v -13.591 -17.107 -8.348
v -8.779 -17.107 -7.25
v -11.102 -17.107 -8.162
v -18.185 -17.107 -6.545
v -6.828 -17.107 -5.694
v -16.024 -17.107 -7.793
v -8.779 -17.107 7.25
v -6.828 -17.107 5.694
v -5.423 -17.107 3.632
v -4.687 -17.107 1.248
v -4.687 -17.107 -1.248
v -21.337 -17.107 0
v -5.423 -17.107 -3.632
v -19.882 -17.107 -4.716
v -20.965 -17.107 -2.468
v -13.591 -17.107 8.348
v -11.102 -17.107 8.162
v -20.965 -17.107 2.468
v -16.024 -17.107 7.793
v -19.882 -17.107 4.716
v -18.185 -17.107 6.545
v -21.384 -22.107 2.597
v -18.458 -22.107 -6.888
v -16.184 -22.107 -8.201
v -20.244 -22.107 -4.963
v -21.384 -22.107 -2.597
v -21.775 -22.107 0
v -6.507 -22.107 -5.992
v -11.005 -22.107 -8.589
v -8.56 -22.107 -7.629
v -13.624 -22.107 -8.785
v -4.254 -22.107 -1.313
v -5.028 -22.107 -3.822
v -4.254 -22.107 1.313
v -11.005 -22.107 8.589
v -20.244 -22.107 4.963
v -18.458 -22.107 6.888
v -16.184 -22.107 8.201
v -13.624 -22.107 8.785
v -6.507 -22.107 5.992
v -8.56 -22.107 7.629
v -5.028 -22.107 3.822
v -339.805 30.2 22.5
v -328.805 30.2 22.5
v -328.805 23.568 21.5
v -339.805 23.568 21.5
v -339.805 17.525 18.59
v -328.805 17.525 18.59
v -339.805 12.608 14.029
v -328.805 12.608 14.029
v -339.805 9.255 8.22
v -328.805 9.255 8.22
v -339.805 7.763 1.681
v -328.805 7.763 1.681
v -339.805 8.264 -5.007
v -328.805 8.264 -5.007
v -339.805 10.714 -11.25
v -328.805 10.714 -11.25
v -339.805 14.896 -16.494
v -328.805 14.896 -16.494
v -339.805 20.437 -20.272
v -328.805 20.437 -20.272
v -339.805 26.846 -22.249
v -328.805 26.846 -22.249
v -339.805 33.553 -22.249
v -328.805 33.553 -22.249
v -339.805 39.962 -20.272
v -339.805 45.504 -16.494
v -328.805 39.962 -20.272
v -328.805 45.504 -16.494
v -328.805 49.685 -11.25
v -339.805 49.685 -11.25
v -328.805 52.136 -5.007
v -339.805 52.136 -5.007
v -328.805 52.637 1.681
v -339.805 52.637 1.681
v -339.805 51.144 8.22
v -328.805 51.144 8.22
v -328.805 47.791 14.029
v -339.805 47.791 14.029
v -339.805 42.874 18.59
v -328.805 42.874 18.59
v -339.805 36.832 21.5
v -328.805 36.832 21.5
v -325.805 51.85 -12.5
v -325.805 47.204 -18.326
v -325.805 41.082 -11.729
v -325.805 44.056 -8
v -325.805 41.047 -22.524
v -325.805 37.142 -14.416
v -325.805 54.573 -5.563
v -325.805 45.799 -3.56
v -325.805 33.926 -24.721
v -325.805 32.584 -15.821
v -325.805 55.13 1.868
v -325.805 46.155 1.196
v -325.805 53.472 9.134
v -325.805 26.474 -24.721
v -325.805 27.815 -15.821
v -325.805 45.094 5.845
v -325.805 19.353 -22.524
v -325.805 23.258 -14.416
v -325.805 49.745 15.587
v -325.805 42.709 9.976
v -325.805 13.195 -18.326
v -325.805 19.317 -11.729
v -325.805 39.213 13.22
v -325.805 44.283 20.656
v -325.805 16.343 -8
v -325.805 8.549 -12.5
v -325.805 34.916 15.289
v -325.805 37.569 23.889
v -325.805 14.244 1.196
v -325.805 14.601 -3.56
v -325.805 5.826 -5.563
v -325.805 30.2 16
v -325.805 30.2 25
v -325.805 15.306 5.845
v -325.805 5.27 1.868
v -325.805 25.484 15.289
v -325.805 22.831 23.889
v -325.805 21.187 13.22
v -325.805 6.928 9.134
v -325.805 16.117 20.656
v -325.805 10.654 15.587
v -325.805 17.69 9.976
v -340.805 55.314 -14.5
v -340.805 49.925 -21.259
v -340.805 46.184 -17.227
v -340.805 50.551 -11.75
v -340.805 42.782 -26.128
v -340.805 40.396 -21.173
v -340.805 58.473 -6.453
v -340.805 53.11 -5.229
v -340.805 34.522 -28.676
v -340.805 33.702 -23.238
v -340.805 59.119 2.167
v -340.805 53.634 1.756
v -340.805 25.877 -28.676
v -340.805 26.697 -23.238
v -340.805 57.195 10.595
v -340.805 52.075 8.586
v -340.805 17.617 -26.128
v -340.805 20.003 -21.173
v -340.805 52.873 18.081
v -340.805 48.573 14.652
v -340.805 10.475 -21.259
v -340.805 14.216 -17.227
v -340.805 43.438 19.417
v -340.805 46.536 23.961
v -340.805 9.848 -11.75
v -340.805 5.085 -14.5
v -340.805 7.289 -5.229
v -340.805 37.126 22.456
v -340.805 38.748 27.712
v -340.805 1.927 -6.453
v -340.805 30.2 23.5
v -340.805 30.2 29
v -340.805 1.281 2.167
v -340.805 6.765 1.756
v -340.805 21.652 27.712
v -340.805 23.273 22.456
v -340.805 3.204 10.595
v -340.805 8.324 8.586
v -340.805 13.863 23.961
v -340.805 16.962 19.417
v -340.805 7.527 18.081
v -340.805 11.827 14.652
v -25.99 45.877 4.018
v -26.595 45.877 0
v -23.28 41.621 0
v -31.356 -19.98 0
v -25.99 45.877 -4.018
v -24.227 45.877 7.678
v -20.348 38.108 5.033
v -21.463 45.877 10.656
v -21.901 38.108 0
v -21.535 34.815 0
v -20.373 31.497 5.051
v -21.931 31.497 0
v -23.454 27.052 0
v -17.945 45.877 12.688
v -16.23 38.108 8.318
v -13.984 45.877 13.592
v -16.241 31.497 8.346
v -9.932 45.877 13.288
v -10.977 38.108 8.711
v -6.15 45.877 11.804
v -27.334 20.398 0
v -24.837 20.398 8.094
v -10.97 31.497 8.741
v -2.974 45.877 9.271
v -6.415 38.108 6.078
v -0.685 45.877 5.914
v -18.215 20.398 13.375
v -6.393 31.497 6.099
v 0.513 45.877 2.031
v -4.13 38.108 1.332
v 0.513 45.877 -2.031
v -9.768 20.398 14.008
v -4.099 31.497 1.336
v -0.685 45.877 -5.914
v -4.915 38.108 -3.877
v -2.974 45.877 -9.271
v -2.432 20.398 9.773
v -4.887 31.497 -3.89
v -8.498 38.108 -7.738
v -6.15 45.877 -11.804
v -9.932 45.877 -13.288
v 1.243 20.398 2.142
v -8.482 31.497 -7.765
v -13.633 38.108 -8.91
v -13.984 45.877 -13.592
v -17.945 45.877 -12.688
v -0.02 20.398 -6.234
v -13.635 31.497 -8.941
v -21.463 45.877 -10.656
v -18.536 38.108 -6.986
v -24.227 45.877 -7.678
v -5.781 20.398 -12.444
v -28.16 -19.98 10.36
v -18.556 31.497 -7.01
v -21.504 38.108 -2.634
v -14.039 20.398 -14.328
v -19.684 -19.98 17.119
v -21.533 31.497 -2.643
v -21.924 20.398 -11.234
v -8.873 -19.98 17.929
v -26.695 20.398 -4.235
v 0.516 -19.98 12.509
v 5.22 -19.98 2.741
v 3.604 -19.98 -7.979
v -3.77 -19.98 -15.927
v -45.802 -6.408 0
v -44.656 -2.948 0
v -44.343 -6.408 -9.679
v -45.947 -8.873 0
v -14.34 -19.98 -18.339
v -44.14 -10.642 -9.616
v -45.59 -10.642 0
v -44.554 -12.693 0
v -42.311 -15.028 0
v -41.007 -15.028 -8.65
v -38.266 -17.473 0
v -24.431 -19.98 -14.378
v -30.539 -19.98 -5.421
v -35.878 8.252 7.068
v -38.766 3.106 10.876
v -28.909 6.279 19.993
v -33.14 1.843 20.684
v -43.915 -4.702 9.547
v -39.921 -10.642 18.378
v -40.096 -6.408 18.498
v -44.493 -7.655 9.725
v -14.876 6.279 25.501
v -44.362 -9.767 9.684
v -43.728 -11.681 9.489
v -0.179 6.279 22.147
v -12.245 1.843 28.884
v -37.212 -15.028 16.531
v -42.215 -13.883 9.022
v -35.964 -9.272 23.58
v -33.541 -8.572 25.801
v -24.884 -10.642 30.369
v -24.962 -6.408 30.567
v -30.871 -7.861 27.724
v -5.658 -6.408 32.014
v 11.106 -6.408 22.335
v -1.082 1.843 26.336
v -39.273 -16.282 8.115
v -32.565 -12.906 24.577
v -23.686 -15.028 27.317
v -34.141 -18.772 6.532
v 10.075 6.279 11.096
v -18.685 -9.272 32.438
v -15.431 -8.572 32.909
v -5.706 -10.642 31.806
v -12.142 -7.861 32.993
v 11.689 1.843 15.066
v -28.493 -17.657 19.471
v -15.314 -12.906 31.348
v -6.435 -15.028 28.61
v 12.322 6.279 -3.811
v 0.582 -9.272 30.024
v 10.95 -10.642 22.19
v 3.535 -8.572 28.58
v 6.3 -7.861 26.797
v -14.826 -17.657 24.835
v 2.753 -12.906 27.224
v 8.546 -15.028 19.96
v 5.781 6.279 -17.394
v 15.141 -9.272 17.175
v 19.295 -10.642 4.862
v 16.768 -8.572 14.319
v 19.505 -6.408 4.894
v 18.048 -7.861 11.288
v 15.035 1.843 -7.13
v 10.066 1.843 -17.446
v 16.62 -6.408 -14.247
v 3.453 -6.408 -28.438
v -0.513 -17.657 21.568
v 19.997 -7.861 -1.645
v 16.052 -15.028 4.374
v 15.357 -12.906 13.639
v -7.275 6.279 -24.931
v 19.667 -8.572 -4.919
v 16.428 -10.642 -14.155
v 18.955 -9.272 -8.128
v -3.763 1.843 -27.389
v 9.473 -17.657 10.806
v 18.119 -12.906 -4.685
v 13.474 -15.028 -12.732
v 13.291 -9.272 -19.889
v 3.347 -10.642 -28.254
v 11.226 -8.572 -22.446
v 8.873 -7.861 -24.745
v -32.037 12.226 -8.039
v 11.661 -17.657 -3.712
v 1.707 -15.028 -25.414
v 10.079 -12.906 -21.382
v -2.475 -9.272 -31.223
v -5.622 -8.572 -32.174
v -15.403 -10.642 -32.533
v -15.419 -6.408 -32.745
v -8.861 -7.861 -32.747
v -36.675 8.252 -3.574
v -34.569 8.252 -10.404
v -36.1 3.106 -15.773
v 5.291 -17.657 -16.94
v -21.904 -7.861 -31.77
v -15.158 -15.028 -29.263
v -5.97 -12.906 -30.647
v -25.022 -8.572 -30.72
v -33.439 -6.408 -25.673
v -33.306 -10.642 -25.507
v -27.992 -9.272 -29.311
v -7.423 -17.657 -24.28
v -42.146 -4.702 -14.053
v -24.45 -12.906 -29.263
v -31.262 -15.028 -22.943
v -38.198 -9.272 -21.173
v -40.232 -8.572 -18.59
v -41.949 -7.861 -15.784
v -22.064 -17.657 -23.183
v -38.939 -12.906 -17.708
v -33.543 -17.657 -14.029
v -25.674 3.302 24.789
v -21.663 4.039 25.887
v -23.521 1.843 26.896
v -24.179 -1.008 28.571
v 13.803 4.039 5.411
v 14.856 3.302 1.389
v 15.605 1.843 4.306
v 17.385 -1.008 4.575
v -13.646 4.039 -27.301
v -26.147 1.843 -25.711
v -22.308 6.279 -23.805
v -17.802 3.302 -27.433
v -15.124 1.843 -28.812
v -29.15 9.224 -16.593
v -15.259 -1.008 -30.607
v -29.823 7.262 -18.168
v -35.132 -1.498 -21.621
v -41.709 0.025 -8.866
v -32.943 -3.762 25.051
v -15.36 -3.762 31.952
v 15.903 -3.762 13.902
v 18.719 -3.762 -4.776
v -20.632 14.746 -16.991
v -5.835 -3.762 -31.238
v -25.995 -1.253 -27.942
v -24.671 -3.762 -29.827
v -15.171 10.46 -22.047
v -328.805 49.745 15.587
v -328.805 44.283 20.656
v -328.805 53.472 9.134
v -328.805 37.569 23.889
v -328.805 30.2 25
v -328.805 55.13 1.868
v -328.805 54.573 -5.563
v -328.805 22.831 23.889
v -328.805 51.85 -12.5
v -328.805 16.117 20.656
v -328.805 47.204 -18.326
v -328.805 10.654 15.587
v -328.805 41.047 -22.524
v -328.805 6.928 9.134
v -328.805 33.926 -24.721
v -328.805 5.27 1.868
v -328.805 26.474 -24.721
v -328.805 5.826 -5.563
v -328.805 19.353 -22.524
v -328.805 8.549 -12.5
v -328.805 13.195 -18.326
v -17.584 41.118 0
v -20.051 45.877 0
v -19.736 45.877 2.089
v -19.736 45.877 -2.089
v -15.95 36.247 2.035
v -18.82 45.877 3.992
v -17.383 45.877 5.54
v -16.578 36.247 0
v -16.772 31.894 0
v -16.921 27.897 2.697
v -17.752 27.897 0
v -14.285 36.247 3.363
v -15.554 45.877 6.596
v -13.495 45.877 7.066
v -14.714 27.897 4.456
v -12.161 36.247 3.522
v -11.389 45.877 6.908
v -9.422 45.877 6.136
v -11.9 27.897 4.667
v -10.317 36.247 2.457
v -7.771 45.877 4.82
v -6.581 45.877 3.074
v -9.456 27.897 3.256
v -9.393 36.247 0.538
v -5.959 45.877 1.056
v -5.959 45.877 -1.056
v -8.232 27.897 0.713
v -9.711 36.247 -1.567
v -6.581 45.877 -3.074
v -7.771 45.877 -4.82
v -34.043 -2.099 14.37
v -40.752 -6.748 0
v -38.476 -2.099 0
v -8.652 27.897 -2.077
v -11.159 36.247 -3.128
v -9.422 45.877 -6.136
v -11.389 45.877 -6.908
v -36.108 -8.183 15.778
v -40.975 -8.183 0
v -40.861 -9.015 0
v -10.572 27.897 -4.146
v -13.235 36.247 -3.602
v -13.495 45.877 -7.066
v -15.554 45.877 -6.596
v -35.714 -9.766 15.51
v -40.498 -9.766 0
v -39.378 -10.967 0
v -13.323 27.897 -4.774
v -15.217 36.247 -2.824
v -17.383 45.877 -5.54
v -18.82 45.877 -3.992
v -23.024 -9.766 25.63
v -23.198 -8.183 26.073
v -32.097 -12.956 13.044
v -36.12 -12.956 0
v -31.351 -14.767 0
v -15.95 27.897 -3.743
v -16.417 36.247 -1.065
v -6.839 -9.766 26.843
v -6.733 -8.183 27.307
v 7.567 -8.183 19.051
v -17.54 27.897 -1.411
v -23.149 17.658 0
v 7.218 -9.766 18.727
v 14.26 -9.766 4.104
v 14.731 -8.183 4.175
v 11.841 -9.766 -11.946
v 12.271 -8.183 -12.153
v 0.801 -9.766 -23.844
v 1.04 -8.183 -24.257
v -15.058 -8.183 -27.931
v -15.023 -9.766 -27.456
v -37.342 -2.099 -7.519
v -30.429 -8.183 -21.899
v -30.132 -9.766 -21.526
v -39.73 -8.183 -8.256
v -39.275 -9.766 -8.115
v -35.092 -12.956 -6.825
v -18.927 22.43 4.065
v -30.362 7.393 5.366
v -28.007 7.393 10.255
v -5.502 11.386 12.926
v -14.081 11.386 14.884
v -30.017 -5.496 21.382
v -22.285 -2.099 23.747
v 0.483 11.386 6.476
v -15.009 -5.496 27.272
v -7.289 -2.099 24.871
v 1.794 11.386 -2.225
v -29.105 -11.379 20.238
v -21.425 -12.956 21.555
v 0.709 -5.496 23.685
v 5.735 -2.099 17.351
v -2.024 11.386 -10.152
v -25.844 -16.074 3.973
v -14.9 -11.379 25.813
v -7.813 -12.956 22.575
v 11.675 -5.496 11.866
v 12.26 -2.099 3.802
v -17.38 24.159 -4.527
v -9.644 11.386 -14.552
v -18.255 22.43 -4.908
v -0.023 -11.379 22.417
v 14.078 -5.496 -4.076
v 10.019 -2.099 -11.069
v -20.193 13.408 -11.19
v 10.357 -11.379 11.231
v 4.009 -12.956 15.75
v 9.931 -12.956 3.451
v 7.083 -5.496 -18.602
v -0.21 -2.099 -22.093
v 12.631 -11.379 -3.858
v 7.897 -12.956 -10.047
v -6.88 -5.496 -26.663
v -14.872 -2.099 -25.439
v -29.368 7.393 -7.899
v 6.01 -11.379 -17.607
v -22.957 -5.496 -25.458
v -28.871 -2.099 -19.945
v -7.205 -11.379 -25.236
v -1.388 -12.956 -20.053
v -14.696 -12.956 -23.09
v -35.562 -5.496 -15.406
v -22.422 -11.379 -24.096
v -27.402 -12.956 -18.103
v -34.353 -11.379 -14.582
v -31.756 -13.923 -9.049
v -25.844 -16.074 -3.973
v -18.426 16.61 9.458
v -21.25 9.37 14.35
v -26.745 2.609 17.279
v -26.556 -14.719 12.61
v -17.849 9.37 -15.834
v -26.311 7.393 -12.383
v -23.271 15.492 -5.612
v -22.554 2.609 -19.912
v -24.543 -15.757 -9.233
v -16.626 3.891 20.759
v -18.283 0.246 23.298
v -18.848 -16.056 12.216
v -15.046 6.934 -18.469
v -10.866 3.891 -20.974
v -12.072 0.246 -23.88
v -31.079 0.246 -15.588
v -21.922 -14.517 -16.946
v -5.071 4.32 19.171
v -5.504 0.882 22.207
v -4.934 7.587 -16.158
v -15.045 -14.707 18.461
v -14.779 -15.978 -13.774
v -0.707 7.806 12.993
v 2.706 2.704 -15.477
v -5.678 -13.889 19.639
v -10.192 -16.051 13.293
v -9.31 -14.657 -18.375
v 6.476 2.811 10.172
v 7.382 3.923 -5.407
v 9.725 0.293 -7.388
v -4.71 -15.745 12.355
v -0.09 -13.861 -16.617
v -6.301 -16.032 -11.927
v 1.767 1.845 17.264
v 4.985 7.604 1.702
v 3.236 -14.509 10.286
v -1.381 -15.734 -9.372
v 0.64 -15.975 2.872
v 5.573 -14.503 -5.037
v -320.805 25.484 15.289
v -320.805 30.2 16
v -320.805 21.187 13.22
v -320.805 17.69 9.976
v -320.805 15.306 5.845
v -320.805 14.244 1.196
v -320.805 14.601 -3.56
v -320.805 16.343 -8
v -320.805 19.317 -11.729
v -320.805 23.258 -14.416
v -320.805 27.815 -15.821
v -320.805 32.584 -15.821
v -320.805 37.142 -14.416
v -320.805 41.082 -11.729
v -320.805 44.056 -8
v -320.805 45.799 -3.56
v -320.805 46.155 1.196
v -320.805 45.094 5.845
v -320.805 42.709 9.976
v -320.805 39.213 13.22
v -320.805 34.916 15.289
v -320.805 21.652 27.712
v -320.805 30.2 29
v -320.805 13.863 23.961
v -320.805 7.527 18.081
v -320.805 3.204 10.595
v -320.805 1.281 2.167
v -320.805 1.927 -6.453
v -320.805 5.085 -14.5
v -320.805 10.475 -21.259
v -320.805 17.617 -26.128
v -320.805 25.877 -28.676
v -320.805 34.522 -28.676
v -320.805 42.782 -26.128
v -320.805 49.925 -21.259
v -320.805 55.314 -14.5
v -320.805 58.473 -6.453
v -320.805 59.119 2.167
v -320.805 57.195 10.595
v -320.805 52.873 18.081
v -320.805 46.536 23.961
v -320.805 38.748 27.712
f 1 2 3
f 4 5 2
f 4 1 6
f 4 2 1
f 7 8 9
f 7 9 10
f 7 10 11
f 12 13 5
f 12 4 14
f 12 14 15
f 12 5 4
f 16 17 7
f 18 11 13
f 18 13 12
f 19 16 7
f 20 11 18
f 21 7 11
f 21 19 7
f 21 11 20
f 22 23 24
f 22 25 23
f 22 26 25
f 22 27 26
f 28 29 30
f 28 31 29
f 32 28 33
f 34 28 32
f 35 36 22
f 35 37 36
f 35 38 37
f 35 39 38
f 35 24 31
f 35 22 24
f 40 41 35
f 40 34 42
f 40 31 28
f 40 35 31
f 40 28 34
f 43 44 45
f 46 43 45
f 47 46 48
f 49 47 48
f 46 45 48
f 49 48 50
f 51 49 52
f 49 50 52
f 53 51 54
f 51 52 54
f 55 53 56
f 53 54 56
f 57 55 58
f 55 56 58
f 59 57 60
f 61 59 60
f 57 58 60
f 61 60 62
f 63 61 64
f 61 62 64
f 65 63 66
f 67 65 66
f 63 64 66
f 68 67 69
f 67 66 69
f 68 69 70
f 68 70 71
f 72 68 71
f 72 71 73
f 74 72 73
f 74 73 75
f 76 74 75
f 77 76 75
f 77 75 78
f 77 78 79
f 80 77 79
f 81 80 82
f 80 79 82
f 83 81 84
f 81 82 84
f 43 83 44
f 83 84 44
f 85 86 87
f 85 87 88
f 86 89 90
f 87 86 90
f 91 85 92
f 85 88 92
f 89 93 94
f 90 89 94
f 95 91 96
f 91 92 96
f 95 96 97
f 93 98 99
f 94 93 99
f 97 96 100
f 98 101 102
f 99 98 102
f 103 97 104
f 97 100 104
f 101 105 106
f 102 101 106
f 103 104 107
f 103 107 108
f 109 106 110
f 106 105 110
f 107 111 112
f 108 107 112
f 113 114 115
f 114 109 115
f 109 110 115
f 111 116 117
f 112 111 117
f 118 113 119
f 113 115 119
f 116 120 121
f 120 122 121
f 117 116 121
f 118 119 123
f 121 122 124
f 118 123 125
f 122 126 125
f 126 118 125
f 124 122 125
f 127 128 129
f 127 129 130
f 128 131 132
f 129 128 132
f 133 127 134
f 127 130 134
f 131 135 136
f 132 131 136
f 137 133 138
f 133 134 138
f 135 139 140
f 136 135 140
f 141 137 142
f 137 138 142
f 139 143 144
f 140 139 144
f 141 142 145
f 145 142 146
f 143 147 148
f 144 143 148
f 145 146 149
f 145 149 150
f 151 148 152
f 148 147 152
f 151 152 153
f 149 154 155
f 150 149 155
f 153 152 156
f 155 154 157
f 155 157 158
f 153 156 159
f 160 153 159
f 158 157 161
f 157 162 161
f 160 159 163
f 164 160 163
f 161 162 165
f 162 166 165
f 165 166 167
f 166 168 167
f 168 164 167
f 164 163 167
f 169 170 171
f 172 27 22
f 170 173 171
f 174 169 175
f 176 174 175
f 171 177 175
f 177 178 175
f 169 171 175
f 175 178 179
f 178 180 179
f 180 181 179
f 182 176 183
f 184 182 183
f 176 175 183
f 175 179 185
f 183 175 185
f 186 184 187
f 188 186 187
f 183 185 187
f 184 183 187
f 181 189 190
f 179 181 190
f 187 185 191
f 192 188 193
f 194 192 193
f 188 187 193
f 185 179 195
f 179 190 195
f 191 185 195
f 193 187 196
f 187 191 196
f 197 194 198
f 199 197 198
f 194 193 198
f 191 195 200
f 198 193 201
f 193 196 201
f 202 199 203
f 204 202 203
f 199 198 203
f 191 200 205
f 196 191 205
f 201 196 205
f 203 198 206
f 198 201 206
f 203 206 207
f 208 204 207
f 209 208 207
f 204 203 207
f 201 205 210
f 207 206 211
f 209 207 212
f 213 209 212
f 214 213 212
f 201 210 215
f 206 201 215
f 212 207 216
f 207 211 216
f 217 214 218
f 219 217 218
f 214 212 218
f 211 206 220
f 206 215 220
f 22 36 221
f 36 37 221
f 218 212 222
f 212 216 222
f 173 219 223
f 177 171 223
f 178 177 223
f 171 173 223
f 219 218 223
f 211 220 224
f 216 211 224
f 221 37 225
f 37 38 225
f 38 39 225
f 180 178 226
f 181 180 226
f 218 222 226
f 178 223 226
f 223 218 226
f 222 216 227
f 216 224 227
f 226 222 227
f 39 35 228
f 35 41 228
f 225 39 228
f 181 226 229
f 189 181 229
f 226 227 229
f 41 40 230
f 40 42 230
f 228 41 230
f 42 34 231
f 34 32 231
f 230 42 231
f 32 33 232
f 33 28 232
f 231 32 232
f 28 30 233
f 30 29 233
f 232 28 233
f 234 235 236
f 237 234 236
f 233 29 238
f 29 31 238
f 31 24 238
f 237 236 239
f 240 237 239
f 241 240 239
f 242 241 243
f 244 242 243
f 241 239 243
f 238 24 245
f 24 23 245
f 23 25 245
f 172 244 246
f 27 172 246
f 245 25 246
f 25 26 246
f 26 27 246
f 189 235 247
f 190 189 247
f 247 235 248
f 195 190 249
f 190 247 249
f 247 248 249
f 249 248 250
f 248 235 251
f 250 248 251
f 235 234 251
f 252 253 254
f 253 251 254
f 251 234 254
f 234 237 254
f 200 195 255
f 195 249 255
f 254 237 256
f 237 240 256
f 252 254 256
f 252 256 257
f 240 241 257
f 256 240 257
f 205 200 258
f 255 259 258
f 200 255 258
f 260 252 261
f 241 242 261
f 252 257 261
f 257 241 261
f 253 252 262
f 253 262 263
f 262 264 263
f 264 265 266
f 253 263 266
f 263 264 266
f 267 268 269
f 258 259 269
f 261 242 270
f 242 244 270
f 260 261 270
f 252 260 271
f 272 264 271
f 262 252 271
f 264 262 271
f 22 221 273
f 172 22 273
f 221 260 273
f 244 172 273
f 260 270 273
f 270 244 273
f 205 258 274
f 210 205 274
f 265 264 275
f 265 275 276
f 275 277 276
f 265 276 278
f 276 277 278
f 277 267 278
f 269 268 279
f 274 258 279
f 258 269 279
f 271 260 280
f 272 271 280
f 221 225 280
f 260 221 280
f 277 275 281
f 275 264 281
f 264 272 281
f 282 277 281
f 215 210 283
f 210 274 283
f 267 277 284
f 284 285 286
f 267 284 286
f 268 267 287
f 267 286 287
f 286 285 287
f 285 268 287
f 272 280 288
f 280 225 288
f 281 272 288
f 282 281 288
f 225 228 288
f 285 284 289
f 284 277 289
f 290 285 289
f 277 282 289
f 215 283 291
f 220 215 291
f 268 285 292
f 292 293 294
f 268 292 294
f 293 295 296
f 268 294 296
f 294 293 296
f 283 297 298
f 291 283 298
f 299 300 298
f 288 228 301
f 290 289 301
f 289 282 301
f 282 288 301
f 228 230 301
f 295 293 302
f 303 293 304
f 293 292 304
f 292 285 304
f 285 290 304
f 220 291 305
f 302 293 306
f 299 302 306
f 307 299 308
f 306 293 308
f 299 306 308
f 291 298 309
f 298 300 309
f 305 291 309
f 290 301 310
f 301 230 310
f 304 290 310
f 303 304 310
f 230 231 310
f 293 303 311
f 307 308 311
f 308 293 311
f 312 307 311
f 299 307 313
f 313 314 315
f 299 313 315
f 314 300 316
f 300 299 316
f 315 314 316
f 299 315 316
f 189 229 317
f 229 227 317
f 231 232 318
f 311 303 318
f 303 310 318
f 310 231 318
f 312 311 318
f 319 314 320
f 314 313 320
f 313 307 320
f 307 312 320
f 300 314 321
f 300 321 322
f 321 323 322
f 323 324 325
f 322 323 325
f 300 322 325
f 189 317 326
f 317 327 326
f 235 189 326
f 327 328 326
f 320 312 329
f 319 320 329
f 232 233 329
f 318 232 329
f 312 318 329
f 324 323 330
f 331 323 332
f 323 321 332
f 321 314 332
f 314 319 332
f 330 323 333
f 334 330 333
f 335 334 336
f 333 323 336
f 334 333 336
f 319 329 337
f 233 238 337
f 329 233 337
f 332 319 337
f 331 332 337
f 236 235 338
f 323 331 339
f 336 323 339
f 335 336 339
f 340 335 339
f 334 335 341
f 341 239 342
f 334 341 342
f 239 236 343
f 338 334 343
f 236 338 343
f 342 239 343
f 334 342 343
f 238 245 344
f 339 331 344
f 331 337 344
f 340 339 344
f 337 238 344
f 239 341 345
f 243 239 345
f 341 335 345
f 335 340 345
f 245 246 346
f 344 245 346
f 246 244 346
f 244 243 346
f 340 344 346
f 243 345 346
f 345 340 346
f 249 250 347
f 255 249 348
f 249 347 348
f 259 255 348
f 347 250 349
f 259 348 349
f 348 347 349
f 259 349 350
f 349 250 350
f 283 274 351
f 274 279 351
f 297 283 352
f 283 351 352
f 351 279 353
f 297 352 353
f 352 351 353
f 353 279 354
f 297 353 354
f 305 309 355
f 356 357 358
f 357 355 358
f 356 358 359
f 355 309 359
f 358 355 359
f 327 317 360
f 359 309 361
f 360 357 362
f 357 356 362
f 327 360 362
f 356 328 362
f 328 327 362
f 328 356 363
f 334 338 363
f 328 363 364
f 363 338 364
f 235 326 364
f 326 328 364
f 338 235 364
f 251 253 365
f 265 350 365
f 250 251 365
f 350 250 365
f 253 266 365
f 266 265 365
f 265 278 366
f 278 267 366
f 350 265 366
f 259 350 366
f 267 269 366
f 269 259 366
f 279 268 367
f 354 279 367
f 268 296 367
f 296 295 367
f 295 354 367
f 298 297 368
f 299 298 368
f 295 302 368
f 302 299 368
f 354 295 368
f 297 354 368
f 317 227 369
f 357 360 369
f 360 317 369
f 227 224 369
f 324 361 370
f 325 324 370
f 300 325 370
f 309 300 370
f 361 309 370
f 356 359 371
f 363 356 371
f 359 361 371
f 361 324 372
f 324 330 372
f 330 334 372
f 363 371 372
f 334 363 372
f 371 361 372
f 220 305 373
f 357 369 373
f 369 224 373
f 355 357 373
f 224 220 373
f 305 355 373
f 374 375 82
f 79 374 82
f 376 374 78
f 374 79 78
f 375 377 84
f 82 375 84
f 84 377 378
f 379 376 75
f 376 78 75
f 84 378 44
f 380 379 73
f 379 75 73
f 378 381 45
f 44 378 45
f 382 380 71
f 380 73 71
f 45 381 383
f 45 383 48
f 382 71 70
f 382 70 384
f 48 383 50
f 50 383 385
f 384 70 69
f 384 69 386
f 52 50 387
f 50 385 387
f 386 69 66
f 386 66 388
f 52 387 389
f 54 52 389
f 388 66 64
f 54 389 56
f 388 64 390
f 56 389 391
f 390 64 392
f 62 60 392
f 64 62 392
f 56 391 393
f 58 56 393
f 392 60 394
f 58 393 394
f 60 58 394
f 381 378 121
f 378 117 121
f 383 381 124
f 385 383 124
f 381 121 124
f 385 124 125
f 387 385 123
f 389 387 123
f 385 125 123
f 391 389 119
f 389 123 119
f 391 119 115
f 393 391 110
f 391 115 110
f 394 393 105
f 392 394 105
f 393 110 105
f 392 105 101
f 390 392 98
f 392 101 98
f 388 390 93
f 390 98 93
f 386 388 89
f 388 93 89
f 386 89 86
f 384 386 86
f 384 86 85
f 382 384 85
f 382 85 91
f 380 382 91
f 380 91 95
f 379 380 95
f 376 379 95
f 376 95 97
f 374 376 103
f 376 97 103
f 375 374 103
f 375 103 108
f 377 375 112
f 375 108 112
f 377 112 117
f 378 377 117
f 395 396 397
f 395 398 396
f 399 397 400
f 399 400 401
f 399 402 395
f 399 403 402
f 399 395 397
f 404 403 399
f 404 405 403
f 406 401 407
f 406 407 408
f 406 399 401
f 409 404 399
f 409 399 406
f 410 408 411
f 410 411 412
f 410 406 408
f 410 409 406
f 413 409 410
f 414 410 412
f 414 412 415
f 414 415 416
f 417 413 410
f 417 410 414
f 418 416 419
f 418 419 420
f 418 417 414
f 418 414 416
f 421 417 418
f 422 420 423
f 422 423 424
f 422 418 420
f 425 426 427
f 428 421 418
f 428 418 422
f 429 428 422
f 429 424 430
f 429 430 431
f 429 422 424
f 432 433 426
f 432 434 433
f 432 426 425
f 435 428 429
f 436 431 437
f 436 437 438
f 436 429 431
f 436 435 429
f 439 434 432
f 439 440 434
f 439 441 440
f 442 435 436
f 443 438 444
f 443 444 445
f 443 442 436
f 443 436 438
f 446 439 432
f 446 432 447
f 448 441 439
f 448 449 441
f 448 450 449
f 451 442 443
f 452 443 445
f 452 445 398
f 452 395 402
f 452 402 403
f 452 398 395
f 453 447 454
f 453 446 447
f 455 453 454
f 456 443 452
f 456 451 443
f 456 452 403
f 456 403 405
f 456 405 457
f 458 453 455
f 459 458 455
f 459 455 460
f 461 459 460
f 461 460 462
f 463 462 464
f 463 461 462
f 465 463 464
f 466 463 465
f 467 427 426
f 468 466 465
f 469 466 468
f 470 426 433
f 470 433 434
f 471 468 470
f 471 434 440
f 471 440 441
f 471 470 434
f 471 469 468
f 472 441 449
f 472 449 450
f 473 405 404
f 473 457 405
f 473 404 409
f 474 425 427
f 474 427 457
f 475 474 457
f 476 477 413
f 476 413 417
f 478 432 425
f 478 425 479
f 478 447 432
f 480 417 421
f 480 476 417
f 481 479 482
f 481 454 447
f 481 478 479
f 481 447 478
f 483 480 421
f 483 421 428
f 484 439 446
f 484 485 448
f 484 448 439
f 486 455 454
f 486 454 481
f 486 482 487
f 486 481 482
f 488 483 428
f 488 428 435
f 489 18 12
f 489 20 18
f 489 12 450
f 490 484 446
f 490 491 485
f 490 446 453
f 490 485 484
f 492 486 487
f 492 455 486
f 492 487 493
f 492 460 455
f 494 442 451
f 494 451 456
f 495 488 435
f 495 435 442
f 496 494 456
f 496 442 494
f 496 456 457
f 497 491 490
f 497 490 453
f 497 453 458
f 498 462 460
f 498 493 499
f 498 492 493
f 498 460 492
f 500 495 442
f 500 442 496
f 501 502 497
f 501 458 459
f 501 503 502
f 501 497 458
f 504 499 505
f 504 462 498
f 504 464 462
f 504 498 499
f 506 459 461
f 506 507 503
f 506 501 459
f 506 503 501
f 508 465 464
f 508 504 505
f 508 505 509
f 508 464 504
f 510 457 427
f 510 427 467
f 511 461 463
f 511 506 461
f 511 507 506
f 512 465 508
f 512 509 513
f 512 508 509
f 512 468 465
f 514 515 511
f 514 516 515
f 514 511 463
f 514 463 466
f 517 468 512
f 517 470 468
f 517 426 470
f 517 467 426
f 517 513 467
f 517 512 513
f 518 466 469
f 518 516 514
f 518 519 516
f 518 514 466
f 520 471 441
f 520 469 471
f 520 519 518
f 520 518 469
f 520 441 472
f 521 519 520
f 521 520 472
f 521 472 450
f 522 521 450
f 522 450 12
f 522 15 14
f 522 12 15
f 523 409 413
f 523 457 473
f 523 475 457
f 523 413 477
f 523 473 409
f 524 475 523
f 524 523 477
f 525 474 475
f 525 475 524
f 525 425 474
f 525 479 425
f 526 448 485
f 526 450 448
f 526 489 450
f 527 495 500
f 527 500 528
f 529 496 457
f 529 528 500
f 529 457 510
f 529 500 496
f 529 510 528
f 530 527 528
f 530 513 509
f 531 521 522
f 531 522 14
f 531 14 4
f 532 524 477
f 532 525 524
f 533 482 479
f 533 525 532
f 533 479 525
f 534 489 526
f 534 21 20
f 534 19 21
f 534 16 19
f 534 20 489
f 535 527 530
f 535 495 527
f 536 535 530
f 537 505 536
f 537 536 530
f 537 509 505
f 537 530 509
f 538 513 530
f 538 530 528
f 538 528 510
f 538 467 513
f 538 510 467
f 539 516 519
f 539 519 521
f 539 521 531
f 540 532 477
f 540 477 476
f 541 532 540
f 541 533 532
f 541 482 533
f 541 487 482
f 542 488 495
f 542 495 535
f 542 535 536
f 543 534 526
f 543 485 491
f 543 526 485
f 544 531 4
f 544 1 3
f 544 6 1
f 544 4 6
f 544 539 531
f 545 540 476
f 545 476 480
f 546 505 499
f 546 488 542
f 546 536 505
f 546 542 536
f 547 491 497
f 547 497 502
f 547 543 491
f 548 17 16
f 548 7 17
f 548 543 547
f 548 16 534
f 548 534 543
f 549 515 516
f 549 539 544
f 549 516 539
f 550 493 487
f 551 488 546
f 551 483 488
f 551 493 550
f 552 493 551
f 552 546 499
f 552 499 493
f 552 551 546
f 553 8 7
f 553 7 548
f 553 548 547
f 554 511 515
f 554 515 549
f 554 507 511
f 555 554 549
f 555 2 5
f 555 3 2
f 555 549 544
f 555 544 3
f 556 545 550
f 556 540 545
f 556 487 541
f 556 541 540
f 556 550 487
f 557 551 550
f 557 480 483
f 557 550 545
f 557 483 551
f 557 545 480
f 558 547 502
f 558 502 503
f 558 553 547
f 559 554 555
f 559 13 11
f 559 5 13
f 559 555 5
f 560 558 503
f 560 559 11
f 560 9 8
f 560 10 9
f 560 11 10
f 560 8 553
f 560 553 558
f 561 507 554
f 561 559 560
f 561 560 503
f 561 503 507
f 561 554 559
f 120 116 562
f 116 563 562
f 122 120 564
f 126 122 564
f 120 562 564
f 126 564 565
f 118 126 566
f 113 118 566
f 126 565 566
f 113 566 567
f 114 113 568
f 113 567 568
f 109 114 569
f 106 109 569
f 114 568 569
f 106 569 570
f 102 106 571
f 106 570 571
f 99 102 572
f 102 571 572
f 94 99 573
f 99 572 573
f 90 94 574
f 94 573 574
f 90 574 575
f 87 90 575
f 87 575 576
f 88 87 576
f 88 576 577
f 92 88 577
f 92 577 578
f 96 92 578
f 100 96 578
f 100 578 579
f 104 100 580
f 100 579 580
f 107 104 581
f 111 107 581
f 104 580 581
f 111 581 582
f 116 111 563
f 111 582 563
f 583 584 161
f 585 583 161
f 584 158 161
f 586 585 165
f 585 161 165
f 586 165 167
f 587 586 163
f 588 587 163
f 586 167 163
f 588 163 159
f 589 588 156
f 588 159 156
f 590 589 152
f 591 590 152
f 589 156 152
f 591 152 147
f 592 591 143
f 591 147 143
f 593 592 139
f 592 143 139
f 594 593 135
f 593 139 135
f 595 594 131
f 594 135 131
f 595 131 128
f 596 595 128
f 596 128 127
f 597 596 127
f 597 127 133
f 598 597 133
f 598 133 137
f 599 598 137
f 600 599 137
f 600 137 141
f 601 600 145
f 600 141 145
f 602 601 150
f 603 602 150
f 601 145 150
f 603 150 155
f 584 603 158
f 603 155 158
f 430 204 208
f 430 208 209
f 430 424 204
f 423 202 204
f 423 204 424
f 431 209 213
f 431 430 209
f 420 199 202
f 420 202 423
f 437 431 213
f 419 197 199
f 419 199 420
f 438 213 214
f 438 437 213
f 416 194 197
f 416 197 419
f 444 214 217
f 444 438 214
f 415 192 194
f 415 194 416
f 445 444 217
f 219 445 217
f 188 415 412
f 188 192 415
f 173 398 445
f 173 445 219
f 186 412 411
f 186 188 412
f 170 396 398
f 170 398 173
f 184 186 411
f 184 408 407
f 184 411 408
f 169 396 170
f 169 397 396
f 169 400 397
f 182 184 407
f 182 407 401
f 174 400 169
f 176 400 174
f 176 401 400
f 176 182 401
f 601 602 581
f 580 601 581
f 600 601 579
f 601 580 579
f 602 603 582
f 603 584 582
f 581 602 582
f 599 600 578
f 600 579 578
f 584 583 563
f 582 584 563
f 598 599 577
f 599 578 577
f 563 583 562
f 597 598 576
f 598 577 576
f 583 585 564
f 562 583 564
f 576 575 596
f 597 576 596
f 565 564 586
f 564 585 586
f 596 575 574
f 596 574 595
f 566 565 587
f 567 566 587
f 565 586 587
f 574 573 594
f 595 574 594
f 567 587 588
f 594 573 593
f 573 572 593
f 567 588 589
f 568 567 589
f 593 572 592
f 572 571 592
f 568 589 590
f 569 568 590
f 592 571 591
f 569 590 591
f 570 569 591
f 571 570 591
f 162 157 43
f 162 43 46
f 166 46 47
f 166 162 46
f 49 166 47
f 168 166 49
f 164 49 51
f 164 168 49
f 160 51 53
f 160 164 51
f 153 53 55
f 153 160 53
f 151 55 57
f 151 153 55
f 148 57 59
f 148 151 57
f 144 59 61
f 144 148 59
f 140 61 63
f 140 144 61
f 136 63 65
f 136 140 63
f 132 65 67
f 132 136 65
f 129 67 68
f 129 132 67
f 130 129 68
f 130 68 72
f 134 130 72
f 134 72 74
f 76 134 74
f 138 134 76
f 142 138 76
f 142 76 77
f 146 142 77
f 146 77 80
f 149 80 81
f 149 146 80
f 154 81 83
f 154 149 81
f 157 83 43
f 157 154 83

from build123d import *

# Parameters (mm, degrees)
CHAMFER_1_SIZE = 1


with BuildPart() as part:
    # 草图1 → 旋转1 (revolve)
    with BuildSketch(Plane.XY):
        with BuildLine():
            Line((-26.595370865, 45.877014743), (-12.965243297, 45.877014743))
            Line((-12.965243297, 45.877014743), (-12.965243297, -22.107402032))
            Line((-12.965243297, -22.107402032), (-21.774959896, -22.107402032))
            add(Edge.make_bspline(
                [(-26.595370865, 45.877014743), (-0.79666506, 20.580411041), (-85.246154667, -11.005701732), (-21.774959896, -22.107402032)],
                knots=[0, 0, 0, 0, 1, 1, 1, 1], degree=3))
        make_face()
    revolve(axis=Axis((-12.965243297, -22.107402032, 0), (0, 1, 0)))

    # 草图2 → 切除-旋转1 (revolve, cut)
    with BuildSketch(Plane.XY):
        with BuildLine():
            Line((-21.33685257, -17.107402032), (-12.965243297, -17.107402032))
            Line((-12.965243297, -17.107402032), (-12.965243297, 45.176601137))
            Line((-12.965243297, 45.176601137), (-12.965243297, 45.877014743))
            Line((-12.965243297, 45.877014743), (-15.079937913, 45.877014743))
            Line((-15.079937913, 45.877014743), (-20.050946276, 45.877014743))
            add(Edge.make_bspline(
                [(-20.050946276, 45.877014743), (-19.550092699, 45.15808437), (-19.082694604, 44.396653294), (-18.065882081, 42.448069869), (-17.568018156, 41.216451543), (-16.851866931, 38.653309297), (-16.635479489, 37.324605775), (-16.490180844, 34.692172894), (-16.559259119, 33.390767191), (-16.91197585, 30.891288816), (-17.19374796, 29.692309456), (-17.893163724, 27.407100616), (-18.310604377, 26.319742349), (-19.22912405, 24.239387784), (-19.730478684, 23.245959998), (-21.313284194, 20.375381767), (-22.470924152, 18.605669157), (-24.862928031, 15.230622799), (-26.099862655, 13.626150262), (-28.588631418, 10.509195003), (-29.841552488, 8.997271276), (-32.30829136, 6.019214188), (-33.523283885, 4.553037065), (-35.260517924, 2.366301479), (-35.825145688, 1.639587978), (-36.910093308, 0.189930887), (-37.430544042, -0.533162703), (-38.404330877, -1.971254233), (-38.85782556, -2.686654553), (-39.662779294, -4.092456136), (-40.014012489, -4.78370185), (-40.565865888, -6.093401153), (-40.764055532, -6.711392977), (-40.92491158, -7.510539933), (-40.956290903, -7.755037527), (-40.980879788, -8.193625915), (-40.974460454, -8.387318334), (-40.933649478, -8.736390668), (-40.899762009, -8.892321127), (-40.802536299, -9.198552263), (-40.738757399, -9.349882034), (-40.564347825, -9.672166644), (-40.453097754, -9.843030046), (-40.170702988, -10.204686784), (-39.999609939, -10.39495082), (-39.398493882, -10.978497512), (-38.880826757, -11.381755698), (-37.688110613, -12.154490491), (-37.014717804, -12.525057552), (-35.576226607, -13.219986812), (-34.810812538, -13.545081172), (-33.223877984, -14.152835912), (-32.402042598, -14.435715659), (-29.882187776, -15.230191934), (-28.131531206, -15.688289387), (-25.457022646, -16.299951348), (-24.556828639, -16.49113738), (-23.197090705, -16.761790819), (-22.742253978, -16.849314163), (-22.057942614, -16.976866822), (-21.829530531, -17.018755203), (-21.512788186, -17.075933319), (-21.424945598, -17.091691842), (-21.33685257, -17.107402032)],
                knots=[0.040556796, 0.040556796, 0.040556796, 0.040556796, 0.0625, 0.0625, 0.09375, 0.09375, 0.125, 0.125, 0.15625, 0.15625, 0.1875, 0.1875, 0.21875, 0.21875, 0.25, 0.25, 0.3125, 0.3125, 0.375, 0.375, 0.4375, 0.4375, 0.5, 0.5, 0.53125, 0.53125, 0.5625, 0.5625, 0.59375, 0.59375, 0.625, 0.625, 0.65625, 0.65625, 0.671875, 0.671875, 0.6875, 0.6875, 0.703125, 0.703125, 0.71875, 0.71875, 0.734375, 0.734375, 0.75, 0.75, 0.78125, 0.78125, 0.8125, 0.8125, 0.84375, 0.84375, 0.875, 0.875, 0.9375, 0.9375, 0.96875, 0.96875, 0.984375, 0.984375, 0.9921875, 0.9921875, 0.995189865, 0.995189865, 0.995189865, 0.995189865], degree=3))
        make_face()
    revolve(axis=Axis((-12.965243297, -17.107402032, 0), (0, 1, 0)), mode=Mode.SUBTRACT)


with BuildPart() as body_2:
    # 草图3 → 旋转2 (revolve)
    with BuildSketch(Plane.XY, mode=Mode.PRIVATE) as revolve_2_sk:
        Polygon((-340.805095673, 52.699663326), (-328.805095673, 52.699663326), (-328.805095673, 55.199663326), (-325.805095673, 55.199663326), (-325.805095673, 46.199663326), (-320.805095673, 46.199663326), (-320.805095673, 59.199663326), (-340.805095673, 59.199663326), align=None)
    revolve(revolve_2_sk.sketch.rotate(Axis((-386.410262995, 30.199663326, 0), (1, 0, 0)), 90), axis=Axis((-386.410262995, 30.199663326, 0), (1, 0, 0)))

    # 倒角1
    chamfer_1_edges = [body_2.edges().sort_by_distance(p)[0] for p in [
        (-340.805095673, 30.199663326, -22.5),
    ]]
    chamfer(chamfer_1_edges, length=CHAMFER_1_SIZE)


solid = Compound([part.part, body_2.part])
